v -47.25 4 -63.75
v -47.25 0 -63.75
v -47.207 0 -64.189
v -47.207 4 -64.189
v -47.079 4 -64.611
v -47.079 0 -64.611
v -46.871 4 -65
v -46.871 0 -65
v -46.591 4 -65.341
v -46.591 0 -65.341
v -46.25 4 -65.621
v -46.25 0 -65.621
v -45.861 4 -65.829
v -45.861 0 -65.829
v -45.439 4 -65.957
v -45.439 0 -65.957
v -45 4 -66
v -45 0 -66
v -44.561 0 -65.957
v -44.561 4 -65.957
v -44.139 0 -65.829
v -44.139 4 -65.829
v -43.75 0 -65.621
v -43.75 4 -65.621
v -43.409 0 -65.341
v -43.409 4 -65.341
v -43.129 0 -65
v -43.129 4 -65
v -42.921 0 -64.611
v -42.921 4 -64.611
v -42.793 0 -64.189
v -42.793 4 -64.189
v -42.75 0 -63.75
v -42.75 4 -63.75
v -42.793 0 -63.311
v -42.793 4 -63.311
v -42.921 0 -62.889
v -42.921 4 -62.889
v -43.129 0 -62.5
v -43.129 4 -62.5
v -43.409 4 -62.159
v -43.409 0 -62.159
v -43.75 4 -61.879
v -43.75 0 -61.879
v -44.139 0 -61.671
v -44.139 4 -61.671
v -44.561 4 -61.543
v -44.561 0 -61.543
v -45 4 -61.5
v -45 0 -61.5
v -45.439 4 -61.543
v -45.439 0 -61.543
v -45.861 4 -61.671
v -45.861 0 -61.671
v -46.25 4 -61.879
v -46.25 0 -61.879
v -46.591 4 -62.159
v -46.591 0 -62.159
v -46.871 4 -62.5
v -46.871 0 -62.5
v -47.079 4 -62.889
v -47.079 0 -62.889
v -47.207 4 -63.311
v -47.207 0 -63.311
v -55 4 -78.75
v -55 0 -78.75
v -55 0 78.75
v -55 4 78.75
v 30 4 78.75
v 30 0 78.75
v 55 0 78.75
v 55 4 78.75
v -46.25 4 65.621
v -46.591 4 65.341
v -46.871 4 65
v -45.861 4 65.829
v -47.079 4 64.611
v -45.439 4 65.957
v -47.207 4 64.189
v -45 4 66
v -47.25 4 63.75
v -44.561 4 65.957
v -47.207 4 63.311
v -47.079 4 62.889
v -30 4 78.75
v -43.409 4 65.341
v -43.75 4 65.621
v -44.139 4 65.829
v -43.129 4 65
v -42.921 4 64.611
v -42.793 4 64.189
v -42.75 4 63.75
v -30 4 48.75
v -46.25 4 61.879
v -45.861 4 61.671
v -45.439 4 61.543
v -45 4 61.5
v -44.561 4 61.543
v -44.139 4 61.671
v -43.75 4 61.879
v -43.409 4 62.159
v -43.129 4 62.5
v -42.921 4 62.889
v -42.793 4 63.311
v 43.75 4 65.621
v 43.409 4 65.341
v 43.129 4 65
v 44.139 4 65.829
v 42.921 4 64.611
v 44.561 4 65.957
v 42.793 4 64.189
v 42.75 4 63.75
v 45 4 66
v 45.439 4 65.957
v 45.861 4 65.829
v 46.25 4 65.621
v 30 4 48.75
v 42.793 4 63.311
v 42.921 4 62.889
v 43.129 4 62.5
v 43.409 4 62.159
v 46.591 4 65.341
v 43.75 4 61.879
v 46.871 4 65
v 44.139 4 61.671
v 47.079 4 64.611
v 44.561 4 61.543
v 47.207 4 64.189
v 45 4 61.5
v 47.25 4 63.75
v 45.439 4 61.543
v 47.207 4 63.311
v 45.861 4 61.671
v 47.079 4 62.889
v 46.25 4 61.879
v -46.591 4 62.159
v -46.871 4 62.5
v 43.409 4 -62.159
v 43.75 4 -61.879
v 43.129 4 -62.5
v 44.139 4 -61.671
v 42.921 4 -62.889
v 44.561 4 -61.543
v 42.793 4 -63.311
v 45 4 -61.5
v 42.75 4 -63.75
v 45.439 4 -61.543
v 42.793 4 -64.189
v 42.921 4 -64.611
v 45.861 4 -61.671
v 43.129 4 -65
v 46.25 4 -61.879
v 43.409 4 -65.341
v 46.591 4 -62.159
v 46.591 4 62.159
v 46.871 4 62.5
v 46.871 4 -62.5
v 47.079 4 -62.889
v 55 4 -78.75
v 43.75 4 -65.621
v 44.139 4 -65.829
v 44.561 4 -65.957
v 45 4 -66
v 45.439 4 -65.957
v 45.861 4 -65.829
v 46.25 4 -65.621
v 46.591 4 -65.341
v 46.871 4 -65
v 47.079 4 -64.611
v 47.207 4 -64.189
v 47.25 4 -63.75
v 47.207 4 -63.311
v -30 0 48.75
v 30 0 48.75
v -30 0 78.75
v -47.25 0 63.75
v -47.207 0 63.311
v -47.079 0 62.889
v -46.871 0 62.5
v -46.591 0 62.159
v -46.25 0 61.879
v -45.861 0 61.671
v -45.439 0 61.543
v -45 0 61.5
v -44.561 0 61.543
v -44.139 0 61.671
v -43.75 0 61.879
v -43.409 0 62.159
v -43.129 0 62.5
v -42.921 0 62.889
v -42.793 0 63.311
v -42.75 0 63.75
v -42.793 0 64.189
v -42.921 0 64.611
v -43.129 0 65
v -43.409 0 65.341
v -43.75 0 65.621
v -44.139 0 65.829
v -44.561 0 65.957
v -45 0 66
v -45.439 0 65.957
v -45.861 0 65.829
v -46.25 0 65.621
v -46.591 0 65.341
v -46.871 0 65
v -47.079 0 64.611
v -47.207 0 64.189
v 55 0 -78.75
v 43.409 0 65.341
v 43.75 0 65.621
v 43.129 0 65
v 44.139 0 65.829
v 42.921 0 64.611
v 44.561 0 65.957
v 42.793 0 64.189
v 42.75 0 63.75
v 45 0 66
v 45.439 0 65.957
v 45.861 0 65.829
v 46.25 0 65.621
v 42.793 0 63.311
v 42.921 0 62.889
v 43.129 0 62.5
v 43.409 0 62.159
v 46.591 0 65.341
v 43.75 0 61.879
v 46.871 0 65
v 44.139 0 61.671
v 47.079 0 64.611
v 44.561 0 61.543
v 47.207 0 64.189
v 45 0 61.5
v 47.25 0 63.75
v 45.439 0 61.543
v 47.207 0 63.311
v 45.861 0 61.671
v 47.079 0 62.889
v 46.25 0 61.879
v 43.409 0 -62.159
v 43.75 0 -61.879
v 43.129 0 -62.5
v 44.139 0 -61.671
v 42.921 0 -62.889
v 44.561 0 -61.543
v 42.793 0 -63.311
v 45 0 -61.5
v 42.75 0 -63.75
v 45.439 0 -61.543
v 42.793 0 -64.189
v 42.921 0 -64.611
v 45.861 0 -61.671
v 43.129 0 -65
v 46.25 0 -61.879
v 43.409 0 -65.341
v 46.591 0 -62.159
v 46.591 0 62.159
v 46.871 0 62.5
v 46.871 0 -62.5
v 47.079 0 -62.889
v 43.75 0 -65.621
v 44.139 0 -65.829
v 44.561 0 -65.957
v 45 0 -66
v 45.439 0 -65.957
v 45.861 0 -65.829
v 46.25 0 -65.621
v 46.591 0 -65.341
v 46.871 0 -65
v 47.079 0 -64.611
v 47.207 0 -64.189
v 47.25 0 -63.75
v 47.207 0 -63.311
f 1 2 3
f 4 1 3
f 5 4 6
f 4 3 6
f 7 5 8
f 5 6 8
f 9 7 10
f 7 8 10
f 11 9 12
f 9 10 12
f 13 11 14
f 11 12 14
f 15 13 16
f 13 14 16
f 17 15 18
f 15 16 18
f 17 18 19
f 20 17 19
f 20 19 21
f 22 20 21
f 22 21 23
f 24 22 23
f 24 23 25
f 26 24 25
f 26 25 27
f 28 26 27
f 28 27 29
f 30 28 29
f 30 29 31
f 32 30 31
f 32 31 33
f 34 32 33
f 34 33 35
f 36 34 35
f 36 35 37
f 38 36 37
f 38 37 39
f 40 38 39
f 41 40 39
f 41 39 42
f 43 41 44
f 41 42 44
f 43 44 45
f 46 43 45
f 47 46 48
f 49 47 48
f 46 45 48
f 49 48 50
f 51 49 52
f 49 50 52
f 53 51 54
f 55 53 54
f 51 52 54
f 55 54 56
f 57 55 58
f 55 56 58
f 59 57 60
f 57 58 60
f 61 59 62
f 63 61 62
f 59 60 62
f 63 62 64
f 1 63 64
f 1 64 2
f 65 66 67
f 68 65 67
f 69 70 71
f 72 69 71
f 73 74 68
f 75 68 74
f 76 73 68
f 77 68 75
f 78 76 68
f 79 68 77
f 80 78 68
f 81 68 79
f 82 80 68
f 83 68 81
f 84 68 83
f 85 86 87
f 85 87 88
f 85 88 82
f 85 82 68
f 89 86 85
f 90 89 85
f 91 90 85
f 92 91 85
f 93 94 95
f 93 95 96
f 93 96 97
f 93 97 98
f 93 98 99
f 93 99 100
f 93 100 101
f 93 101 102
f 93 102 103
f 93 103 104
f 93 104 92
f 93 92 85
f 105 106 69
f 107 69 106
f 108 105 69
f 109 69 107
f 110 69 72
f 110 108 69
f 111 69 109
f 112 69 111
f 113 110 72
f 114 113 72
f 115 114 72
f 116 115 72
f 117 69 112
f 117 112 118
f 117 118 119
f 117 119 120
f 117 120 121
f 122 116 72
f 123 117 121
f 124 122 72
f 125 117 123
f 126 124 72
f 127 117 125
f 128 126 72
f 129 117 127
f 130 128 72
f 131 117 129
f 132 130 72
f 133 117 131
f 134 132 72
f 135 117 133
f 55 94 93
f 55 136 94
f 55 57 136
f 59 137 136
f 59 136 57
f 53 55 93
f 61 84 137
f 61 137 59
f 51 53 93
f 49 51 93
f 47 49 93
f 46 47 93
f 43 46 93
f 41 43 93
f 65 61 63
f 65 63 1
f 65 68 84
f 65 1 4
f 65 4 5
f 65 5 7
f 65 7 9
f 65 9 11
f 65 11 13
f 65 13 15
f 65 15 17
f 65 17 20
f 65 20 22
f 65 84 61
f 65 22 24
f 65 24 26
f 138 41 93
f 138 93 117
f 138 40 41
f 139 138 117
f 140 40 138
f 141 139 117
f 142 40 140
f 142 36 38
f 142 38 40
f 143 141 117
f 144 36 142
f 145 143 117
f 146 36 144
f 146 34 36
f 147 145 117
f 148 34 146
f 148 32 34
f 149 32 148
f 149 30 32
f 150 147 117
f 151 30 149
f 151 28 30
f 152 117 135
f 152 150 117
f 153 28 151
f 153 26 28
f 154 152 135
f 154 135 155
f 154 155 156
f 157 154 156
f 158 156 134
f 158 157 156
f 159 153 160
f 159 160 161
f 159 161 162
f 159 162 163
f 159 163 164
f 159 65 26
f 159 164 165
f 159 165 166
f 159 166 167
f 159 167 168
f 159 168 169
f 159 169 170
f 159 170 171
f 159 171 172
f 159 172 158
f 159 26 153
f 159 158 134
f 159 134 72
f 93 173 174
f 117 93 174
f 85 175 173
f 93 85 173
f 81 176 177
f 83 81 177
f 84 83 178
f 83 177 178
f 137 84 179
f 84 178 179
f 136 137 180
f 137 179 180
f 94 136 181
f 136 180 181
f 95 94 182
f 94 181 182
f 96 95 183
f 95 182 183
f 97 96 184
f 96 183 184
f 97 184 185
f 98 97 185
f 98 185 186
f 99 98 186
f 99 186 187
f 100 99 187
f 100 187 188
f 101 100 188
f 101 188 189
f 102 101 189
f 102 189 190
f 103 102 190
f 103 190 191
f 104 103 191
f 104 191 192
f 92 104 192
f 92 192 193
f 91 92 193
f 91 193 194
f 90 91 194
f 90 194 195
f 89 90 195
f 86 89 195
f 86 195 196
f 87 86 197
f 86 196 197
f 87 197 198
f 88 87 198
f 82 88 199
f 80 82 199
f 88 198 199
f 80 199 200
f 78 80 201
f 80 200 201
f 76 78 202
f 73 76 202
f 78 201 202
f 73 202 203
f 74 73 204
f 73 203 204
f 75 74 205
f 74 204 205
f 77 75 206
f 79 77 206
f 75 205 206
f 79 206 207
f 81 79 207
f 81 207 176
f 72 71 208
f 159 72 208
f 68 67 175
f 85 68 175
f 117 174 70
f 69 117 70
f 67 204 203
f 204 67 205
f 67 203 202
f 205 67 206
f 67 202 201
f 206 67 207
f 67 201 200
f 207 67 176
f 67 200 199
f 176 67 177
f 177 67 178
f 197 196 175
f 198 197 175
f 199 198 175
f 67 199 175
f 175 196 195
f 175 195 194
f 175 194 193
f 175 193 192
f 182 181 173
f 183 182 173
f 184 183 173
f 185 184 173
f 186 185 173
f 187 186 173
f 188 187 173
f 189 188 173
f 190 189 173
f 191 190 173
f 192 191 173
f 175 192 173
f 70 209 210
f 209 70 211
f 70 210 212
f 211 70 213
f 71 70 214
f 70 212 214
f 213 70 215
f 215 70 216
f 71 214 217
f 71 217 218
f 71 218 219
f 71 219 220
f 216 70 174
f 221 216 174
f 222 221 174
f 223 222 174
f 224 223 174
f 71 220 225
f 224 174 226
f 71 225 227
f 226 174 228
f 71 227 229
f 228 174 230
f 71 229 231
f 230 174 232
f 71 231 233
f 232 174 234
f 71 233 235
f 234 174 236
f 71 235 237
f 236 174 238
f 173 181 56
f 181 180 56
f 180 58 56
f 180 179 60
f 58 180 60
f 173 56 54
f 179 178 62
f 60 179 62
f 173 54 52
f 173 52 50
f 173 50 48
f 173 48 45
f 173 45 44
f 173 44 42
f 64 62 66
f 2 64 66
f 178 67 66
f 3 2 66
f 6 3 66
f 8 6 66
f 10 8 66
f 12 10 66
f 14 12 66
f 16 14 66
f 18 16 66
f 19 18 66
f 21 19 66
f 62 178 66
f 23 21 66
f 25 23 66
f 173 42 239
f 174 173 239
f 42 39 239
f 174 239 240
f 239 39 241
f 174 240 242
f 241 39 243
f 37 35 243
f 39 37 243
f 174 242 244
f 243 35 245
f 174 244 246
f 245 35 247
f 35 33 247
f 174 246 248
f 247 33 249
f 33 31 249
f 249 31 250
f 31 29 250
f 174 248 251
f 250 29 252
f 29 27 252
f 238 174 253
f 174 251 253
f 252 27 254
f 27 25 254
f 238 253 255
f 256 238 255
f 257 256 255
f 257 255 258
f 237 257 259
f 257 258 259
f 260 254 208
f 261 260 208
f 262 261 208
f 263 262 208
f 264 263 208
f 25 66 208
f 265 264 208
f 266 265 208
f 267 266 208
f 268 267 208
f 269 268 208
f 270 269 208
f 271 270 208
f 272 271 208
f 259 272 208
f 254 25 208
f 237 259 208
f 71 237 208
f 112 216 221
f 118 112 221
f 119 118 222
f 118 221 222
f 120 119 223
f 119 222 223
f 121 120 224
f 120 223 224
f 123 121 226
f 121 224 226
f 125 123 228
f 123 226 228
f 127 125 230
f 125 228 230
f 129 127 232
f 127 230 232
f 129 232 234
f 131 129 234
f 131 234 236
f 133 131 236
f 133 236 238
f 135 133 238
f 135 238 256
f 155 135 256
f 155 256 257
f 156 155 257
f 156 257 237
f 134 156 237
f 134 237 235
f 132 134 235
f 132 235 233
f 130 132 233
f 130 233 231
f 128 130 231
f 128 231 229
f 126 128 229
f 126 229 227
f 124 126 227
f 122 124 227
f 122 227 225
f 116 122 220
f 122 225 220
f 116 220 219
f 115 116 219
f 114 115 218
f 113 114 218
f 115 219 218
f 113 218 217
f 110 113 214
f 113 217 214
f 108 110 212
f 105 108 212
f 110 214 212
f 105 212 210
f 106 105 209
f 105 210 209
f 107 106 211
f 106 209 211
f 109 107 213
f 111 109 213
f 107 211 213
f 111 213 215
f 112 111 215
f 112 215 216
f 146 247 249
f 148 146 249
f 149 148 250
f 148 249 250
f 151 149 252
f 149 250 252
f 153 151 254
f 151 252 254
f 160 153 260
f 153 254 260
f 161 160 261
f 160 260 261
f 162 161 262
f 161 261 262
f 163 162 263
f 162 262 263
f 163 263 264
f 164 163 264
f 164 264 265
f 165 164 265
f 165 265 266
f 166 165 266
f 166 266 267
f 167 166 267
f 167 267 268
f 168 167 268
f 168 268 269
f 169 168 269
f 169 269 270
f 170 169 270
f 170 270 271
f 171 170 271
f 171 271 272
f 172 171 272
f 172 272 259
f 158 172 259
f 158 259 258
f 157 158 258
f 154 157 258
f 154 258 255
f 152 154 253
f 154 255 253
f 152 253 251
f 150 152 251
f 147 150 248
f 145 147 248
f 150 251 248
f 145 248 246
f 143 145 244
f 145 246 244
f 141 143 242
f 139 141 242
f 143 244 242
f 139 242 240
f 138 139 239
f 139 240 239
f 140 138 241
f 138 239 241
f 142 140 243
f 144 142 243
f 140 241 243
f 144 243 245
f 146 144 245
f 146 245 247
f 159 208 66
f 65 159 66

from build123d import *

# Parameters (mm, degrees)
RESSALTO_EXTRUS_O1_DEPTH = 4
FURO_COM_FOLGA_DE_M41_D  = 4.5


with BuildPart() as part:
    # Esboço1 → Ressalto-extrusão1 (new body)
    with BuildSketch(Plane(origin=(0, 0, 0), x_dir=(1, 0, 0), z_dir=(0, 1, 0))):
        Polygon((30, -78.75), (55, -78.75), (55, 78.75), (-55, 78.75), (-55, -78.75), (-30, -78.75), (-30, -48.75), (30, -48.75), align=None)
    extrude(amount=RESSALTO_EXTRUS_O1_DEPTH)

    # Furo com folga de M41 (through all)
    with Locations(Plane(origin=(0, 4, 0), x_dir=(1, 0, 0), z_dir=(0, 1, 0))):
        with Locations((-45, 63.75), (45, 63.75), (45, -63.75), (-45, -63.75)):
            Hole(FURO_COM_FOLGA_DE_M41_D / 2)


solid = part.part
